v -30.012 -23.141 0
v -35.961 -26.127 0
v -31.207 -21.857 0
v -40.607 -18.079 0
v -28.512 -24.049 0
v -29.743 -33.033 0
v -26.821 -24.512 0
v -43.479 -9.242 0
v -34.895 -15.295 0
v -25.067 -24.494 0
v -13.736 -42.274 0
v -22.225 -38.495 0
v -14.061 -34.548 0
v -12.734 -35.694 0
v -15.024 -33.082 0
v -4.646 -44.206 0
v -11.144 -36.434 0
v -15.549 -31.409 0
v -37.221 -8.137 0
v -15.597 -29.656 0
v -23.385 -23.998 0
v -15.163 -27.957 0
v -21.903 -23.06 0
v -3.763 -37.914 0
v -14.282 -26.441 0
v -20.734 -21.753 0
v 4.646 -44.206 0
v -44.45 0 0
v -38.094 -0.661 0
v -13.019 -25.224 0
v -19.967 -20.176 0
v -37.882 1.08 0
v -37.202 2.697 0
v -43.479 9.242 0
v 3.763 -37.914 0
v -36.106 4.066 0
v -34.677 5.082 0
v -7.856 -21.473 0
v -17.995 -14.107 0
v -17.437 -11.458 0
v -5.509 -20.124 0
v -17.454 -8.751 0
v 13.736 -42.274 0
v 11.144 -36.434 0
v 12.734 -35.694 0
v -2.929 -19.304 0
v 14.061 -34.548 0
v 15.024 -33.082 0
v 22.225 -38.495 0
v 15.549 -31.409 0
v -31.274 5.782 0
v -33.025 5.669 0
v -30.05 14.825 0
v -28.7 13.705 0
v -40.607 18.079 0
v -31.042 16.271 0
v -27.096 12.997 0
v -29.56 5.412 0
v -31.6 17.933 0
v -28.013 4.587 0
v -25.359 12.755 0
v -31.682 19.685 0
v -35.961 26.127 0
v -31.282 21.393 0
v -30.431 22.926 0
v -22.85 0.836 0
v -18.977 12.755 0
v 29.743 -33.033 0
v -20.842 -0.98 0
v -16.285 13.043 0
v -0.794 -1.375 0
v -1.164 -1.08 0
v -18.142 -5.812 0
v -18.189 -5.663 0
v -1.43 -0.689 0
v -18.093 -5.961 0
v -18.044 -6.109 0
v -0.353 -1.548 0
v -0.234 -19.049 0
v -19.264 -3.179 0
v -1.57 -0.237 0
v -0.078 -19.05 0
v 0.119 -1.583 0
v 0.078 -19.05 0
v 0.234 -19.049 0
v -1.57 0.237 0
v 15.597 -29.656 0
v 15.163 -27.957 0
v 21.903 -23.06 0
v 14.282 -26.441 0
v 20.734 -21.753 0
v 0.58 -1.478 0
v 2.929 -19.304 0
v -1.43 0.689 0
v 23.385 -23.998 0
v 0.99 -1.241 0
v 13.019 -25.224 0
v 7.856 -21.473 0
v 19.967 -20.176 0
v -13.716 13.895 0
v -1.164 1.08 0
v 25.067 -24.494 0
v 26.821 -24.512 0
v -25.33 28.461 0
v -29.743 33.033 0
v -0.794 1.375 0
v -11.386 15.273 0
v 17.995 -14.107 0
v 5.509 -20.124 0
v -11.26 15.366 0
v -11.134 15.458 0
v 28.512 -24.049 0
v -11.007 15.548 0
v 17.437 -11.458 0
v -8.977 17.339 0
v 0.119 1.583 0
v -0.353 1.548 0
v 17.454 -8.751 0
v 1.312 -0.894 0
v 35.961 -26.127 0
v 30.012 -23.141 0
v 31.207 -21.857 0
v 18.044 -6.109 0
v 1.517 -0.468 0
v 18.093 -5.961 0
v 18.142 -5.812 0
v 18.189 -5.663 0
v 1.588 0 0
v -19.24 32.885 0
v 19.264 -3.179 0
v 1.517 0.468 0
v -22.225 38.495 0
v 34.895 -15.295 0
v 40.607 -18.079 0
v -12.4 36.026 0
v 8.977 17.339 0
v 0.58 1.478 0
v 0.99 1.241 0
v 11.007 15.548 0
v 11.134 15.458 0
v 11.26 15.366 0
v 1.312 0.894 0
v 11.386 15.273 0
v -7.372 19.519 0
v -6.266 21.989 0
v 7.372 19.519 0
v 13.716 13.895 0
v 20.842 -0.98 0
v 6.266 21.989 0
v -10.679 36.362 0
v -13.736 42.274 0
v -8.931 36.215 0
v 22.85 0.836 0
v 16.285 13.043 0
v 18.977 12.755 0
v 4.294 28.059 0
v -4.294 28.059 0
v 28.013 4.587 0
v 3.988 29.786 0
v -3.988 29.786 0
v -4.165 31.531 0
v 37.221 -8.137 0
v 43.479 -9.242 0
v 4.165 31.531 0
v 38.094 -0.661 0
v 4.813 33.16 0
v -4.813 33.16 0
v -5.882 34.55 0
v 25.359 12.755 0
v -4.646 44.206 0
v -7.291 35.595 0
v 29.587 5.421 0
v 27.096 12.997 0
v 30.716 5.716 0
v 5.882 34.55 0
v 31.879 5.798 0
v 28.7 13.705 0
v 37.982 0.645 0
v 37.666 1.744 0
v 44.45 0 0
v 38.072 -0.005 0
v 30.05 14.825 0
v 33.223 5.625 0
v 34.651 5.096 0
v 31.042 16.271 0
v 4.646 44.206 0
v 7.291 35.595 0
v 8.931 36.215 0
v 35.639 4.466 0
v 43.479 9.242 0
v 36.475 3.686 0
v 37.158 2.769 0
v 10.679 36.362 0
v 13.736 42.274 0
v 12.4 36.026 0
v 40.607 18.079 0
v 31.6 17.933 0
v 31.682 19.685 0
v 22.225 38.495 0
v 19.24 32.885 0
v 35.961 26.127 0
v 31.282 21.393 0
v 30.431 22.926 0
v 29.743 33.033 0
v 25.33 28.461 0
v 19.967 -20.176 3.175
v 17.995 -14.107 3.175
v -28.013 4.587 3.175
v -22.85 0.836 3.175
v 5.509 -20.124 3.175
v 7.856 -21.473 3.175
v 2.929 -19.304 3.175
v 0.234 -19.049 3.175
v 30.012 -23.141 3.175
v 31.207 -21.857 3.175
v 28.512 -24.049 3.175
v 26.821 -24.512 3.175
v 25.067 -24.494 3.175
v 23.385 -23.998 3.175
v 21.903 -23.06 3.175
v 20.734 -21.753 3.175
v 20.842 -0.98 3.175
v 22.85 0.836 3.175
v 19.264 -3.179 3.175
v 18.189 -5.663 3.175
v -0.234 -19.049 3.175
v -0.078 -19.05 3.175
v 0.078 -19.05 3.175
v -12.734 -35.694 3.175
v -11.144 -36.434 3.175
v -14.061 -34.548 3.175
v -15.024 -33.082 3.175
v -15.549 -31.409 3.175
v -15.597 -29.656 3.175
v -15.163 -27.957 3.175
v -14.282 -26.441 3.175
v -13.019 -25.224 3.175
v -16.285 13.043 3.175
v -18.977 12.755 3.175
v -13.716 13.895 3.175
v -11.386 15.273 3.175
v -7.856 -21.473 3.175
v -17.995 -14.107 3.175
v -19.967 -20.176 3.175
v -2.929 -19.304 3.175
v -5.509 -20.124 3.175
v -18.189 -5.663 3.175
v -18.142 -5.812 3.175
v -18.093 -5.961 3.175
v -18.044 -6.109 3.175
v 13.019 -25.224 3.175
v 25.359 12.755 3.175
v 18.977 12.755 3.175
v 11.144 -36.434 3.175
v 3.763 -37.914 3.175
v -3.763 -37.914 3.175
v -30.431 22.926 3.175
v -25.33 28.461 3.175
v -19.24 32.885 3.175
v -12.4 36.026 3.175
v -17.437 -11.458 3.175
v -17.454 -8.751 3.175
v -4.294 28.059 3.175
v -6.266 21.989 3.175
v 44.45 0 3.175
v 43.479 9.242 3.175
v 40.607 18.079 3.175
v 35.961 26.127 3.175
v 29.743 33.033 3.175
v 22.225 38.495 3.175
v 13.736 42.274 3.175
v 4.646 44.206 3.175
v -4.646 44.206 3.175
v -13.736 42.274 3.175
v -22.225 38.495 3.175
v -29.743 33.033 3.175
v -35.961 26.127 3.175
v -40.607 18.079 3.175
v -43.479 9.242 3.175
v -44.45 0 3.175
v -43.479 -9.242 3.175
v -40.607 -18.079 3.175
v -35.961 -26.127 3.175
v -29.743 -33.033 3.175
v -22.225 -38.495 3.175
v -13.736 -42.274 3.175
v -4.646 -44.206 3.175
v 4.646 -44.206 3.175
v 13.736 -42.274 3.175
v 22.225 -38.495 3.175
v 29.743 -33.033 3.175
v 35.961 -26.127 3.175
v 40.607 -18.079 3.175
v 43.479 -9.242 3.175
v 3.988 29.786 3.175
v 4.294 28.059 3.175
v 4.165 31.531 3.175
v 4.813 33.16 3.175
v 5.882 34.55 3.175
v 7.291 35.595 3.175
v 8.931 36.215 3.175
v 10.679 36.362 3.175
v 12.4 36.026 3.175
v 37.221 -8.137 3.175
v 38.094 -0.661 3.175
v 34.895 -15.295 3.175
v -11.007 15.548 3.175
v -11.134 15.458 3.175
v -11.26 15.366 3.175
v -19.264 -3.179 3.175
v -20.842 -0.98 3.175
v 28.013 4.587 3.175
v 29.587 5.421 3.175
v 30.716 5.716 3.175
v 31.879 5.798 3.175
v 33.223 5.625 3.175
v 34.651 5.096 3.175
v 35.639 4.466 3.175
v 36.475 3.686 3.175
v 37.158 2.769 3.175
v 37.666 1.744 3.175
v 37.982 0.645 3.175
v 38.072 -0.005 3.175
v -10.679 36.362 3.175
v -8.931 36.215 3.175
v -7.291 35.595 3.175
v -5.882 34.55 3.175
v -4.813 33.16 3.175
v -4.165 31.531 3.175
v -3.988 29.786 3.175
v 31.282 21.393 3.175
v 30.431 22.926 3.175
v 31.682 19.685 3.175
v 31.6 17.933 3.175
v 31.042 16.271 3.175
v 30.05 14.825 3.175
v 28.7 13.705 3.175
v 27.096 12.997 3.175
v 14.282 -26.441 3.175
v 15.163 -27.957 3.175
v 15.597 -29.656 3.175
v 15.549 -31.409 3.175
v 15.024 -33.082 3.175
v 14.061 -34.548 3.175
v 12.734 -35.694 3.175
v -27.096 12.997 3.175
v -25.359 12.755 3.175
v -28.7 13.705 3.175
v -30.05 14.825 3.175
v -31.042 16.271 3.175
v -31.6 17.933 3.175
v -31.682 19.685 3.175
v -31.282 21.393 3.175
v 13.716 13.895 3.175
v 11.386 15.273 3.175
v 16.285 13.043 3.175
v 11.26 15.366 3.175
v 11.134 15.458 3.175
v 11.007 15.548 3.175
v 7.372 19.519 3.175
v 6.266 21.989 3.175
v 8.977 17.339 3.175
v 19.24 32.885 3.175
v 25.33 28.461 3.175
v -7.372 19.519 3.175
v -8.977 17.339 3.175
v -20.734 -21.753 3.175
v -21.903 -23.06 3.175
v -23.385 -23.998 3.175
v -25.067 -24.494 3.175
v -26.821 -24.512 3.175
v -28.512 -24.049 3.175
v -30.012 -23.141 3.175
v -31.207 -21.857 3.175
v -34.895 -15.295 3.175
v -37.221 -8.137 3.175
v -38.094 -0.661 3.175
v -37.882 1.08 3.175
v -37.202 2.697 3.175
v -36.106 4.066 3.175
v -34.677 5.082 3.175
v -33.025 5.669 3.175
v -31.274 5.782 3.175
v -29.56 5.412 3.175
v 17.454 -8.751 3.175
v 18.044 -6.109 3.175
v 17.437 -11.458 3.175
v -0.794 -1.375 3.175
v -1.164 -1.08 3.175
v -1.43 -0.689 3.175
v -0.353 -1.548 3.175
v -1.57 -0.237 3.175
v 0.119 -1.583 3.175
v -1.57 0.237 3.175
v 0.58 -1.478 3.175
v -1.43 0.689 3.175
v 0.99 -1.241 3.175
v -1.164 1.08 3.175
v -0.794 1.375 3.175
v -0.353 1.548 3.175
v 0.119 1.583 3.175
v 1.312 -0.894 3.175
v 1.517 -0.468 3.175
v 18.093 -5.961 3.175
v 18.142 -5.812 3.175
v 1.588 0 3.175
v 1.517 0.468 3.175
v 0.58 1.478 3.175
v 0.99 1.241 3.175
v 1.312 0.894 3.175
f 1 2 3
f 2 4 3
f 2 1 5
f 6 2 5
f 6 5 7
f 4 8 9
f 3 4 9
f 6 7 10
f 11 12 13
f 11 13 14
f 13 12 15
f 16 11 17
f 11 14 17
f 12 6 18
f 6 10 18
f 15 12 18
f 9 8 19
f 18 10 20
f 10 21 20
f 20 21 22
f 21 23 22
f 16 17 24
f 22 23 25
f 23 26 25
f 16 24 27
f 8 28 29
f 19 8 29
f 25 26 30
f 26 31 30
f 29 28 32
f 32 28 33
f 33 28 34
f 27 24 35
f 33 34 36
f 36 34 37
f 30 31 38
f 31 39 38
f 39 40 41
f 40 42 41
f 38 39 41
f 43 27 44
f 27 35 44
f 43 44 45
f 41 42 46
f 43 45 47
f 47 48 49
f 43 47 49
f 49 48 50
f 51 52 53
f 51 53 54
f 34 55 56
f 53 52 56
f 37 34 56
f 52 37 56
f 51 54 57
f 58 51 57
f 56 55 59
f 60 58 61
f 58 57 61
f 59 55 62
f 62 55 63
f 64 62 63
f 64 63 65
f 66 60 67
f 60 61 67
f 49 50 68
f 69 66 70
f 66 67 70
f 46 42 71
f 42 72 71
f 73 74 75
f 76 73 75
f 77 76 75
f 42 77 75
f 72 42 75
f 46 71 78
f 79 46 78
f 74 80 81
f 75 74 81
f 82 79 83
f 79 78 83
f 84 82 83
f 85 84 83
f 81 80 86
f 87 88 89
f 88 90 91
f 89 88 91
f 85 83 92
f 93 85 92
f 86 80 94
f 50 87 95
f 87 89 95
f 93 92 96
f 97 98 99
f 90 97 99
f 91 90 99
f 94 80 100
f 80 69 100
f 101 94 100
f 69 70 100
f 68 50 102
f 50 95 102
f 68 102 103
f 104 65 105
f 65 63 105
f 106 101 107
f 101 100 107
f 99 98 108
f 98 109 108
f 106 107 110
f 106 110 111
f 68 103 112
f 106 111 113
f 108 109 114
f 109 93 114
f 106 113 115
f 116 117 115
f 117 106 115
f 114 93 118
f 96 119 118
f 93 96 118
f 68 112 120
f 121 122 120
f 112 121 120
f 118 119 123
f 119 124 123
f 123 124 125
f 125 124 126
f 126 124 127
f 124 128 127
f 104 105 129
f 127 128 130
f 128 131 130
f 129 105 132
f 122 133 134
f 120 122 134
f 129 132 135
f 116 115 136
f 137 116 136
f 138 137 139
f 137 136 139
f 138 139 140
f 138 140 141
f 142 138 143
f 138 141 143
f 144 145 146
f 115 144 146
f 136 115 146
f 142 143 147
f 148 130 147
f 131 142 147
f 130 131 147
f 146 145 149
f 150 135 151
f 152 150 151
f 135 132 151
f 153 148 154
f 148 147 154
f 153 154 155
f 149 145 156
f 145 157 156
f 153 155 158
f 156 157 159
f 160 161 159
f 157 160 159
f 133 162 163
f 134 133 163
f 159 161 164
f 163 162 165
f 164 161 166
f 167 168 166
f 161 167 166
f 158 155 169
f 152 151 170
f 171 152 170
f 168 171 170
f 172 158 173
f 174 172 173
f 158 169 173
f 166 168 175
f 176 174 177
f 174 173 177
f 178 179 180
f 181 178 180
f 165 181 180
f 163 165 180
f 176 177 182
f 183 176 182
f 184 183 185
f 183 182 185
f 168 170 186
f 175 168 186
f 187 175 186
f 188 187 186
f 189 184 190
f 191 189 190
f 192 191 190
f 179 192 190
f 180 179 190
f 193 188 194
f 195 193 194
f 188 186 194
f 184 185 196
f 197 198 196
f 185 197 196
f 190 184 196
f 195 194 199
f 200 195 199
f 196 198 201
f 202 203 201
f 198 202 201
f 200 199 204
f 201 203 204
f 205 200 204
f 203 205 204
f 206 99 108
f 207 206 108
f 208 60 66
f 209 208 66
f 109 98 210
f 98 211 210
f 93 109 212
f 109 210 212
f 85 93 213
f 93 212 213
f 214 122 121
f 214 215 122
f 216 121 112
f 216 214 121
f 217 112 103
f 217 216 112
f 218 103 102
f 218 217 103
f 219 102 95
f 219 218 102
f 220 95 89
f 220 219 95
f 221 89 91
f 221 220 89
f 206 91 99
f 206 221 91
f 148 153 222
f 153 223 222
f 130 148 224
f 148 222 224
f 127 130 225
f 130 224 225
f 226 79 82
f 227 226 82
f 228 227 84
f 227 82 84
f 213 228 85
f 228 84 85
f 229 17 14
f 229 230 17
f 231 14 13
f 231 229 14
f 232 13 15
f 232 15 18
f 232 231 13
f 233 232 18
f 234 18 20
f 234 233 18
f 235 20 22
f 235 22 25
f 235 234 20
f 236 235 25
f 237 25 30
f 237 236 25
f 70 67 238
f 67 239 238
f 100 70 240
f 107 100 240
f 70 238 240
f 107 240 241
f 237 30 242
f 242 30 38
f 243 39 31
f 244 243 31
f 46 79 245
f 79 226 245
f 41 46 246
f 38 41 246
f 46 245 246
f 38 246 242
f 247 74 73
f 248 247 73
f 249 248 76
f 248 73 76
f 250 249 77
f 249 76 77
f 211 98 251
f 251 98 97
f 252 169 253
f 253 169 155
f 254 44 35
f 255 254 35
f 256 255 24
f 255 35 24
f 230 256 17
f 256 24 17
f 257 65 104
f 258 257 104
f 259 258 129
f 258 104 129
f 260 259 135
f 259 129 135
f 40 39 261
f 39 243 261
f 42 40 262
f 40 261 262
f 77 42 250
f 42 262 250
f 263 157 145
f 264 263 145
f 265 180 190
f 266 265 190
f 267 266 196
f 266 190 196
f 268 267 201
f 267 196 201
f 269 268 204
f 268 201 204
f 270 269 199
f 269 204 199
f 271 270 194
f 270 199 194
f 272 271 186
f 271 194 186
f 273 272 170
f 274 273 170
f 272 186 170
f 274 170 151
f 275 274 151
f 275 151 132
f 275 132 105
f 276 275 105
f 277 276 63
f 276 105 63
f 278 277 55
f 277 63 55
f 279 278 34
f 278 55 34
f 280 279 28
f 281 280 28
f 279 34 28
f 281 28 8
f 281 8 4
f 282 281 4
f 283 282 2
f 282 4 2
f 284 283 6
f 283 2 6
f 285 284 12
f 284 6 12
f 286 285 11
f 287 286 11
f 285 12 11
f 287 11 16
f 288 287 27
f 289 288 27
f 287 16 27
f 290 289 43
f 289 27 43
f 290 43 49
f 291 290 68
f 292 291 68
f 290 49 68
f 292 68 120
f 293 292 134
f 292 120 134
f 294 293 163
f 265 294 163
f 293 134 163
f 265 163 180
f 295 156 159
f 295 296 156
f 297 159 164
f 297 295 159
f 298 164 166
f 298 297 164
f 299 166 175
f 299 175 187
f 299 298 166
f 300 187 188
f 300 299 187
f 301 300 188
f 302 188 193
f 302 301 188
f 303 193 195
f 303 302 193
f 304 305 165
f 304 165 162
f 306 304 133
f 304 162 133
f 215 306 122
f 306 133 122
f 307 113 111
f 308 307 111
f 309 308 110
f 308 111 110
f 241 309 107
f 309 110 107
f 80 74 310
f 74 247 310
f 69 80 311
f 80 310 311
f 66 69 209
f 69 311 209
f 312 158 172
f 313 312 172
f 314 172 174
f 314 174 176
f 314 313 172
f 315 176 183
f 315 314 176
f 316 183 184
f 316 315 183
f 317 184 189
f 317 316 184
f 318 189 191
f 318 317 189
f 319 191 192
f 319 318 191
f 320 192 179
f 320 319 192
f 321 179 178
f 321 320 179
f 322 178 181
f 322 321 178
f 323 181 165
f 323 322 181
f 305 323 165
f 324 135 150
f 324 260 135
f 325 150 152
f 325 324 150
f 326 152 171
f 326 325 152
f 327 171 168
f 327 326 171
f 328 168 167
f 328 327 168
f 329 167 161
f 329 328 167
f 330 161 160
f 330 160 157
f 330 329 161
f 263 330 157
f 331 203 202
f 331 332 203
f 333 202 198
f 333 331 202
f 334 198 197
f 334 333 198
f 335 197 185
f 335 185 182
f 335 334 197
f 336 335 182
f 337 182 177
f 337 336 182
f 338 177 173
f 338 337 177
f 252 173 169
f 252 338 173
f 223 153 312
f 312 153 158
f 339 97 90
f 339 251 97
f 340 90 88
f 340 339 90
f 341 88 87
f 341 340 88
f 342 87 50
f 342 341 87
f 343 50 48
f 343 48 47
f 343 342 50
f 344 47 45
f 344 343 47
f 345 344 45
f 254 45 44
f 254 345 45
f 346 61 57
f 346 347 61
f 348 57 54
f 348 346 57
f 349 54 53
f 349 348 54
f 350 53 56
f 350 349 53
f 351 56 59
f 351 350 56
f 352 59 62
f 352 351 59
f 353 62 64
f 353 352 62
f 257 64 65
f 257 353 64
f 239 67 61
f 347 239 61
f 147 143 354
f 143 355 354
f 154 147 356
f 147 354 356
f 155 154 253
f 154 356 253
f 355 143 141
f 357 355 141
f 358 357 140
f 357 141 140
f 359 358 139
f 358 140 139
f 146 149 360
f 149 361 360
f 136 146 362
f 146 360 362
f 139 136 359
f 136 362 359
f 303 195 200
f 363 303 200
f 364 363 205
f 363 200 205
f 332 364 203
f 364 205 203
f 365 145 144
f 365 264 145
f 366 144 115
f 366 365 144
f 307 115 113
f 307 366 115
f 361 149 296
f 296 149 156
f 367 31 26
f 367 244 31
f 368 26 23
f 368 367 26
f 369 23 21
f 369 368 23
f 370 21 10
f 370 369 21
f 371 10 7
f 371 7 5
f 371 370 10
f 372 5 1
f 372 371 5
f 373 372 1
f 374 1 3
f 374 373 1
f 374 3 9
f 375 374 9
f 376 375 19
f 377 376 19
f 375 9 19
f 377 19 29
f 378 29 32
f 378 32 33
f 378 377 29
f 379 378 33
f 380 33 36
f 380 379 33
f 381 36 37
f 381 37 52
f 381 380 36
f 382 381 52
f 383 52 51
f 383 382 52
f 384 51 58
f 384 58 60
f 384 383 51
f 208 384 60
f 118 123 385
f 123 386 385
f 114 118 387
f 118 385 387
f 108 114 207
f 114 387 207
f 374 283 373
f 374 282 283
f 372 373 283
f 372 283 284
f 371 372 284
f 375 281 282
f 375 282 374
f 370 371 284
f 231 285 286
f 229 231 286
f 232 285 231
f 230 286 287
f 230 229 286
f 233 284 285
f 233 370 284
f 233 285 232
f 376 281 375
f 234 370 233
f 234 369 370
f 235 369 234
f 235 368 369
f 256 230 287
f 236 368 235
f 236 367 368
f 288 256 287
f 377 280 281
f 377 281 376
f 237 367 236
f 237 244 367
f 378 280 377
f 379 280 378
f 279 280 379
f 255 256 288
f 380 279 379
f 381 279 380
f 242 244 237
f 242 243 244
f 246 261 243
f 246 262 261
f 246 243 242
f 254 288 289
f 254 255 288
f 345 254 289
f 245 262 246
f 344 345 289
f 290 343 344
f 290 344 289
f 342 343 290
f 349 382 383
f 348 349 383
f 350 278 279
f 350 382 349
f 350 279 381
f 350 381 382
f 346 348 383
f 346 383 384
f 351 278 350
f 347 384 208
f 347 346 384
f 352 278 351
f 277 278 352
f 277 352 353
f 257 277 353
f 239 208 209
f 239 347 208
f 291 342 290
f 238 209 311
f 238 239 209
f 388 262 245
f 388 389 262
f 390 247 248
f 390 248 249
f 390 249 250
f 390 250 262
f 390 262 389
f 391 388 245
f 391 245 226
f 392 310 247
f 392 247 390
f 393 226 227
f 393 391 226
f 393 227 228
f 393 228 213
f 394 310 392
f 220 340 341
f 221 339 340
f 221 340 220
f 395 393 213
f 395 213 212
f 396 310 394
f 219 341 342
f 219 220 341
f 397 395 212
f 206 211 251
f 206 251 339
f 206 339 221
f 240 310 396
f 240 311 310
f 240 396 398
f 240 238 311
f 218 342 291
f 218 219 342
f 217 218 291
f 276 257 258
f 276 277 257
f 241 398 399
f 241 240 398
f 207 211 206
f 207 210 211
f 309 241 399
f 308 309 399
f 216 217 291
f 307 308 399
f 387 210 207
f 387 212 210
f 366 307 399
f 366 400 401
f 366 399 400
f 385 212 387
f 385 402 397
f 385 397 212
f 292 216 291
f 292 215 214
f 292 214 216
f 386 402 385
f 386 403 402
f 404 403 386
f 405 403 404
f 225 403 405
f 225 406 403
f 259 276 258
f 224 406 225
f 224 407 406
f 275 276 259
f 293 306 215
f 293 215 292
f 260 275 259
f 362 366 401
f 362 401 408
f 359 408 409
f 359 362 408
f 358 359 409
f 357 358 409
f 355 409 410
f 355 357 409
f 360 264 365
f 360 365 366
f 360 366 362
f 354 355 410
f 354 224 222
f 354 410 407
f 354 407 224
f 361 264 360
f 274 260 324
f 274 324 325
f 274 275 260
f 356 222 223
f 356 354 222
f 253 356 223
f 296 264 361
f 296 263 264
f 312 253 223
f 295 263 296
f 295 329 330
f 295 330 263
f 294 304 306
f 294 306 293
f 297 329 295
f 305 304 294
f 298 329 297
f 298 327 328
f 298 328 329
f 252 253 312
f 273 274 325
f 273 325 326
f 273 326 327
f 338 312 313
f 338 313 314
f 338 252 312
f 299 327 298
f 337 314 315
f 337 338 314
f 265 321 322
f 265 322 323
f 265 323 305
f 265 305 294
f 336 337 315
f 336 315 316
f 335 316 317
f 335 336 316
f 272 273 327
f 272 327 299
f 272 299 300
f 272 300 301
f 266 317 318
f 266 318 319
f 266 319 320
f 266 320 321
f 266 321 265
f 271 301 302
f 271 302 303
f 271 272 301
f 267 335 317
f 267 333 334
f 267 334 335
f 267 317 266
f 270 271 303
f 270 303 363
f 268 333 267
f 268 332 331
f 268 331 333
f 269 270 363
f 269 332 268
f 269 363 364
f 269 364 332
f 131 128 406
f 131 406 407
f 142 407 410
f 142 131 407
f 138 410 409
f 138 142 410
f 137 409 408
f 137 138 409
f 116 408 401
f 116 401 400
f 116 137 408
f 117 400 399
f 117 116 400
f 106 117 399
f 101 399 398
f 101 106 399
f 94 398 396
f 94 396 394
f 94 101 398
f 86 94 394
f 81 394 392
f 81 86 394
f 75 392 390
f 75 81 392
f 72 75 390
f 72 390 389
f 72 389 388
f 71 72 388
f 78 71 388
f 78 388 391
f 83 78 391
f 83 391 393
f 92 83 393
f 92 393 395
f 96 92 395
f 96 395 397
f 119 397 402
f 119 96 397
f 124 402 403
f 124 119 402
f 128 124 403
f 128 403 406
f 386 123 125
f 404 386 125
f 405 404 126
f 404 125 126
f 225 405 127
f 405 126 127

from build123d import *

# Parameters (mm, degrees)
F0_R     = 44.45
F0_R_2   = 1.5875
F1_DEPTH = 3.175
F2_R     = 12.7
F3_R     = 6.35


with BuildPart() as f1:
    # F0 (on Top) → F1 (new body)
    with BuildSketch(Plane.XY):
        Circle(F0_R)
        with BuildLine():
            ThreePointArc((39.2548577101, 12.7546764428), (40.7668362581, 6.4568325445), (41.275, 0))
            ThreePointArc((41.275, 0), (36.7762942859, -18.7384578767), (24.2608362884, -33.3921764428))
            ThreePointArc((24.2608362884, -33.3921764428), (0, -41.275), (-24.2608362884, -33.3921764428))
            ThreePointArc((-24.2608362884, -33.3921764428), (-39.2548577101, -12.7546764428), (-39.2548577101, 12.7546764428))
            ThreePointArc((-39.2548577101, 12.7546764428), (-24.2608362884, 33.3921764428), (0, 41.275))
            ThreePointArc((0, 41.275), (24.2608362884, 33.3921764428), (39.2548577101, 12.7546764428))
        make_face(mode=Mode.SUBTRACT)
        with BuildLine():
            Line((-1.0361992177, 38.0859067265), (0, 41.275))
            ThreePointArc((0, 41.275), (-24.2608362884, 33.3921764428), (-39.2548577101, 12.7546764428))
            Line((-39.2548577101, 12.7546764428), (-35.9016466034, 12.7546764428))
            ThreePointArc((-35.9016466034, 12.7546764428), (-22.3946181123, 30.8235474857), (-1.0361992177, 38.0859067265))
        make_face()
        with BuildLine():
            ThreePointArc((-39.2548577101, 12.7546764428), (-39.2548577101, -12.7546764428), (-24.2608362884, -33.3921764428))
            Line((-24.2608362884, -33.3921764428), (-23.2246370707, -30.2030831693))
            ThreePointArc((-23.2246370707, -30.2030831693), (-36.2352532708, -11.7735474857), (-36.5420529391, 10.7837084065))
            Line((-36.5420529391, 10.7837084065), (-39.2548577101, 12.7546764428))
        make_face()
        with BuildLine():
            ThreePointArc((-24.2608362884, -33.3921764428), (0, -41.275), (24.2608362884, -33.3921764428))
            Line((24.2608362884, -33.3921764428), (21.5480315174, -31.4212084065))
            ThreePointArc((21.5480315174, -31.4212084065), (0, -38.1), (-21.5480315174, -31.4212084065))
            Line((-21.5480315174, -31.4212084065), (-24.2608362884, -33.3921764428))
        make_face()
        with BuildLine():
            ThreePointArc((24.2608362884, -33.3921764428), (36.7762942859, -18.7384578767), (41.275, 0))
            ThreePointArc((41.275, 0), (40.7668362581, 6.4568325445), (39.2548577101, 12.7546764428))
            Line((39.2548577101, 12.7546764428), (36.5420529391, 10.7837084065))
            ThreePointArc((36.5420529391, 10.7837084065), (37.7085018065, 5.447833653), (38.1, 0))
            ThreePointArc((38.1, 0), (34.1794431815, -16.833765586), (23.2246370707, -30.2030831693))
            Line((23.2246370707, -30.2030831693), (24.2608362884, -33.3921764428))
        make_face()
        with BuildLine():
            Line((35.9016466034, 12.7546764428), (39.2548577101, 12.7546764428))
            ThreePointArc((39.2548577101, 12.7546764428), (24.2608362884, 33.3921764428), (0, 41.275))
            Line((0, 41.275), (1.0361992177, 38.0859067265))
            ThreePointArc((1.0361992177, 38.0859067265), (22.3946181123, 30.8235474857), (35.9016466034, 12.7546764428))
        make_face()
        with BuildLine():
            Line((7.7578470137, 17.398801962), (1.0361992177, 38.0859067265))
            ThreePointArc((1.0361992177, 38.0859067265), (0, 38.1), (-1.0361992177, 38.0859067265))
            Line((-1.0361992177, 38.0859067265), (-7.7578470137, 17.398801962))
            ThreePointArc((-7.7578470137, 17.398801962), (0, 19.05), (7.7578470137, 17.398801962))
        make_face()
        with BuildLine():
            Line((-14.1499374147, 12.7546764428), (-35.9016466034, 12.7546764428))
            ThreePointArc((-35.9016466034, 12.7546764428), (-36.2352532708, 11.7735474857), (-36.5420529391, 10.7837084065))
            Line((-36.5420529391, 10.7837084065), (-18.9445505487, -2.0016254668))
            ThreePointArc((-18.9445505487, -2.0016254668), (-18.1176266354, 5.8867737428), (-14.1499374147, 12.7546764428))
        make_face()
        with BuildLine():
            Line((18.9445505487, -2.0016254668), (36.5420529391, 10.7837084065))
            ThreePointArc((36.5420529391, 10.7837084065), (36.2352532708, 11.7735474857), (35.9016466034, 12.7546764428))
            Line((35.9016466034, 12.7546764428), (14.1499374147, 12.7546764428))
            ThreePointArc((14.1499374147, 12.7546764428), (17.7828401521, 6.8317710826), (19.05, 0))
            ThreePointArc((19.05, 0), (19.0236193711, -1.0022005907), (18.9445505487, -2.0016254668))
        make_face()
        with BuildLine():
            Line((3.9505291269, -18.6358745332), (21.5480315174, -31.4212084065))
            ThreePointArc((21.5480315174, -31.4212084065), (22.3946181123, -30.8235474857), (23.2246370707, -30.2030831693))
            Line((23.2246370707, -30.2030831693), (16.5029892747, -9.5159784048))
            ThreePointArc((16.5029892747, -9.5159784048), (11.1973090562, -15.4117737428), (3.9505291269, -18.6358745332))
        make_face()
        with BuildLine():
            Line((-16.5029892747, -9.5159784048), (-23.2246370707, -30.2030831693))
            ThreePointArc((-23.2246370707, -30.2030831693), (-22.3946181123, -30.8235474857), (-21.5480315174, -31.4212084065))
            Line((-21.5480315174, -31.4212084065), (-3.9505291269, -18.6358745332))
            ThreePointArc((-3.9505291269, -18.6358745332), (-11.1973090562, -15.4117737428), (-16.5029892747, -9.5159784048))
        make_face()
        with BuildLine():
            Line((-35.9016466034, 12.7546764428), (-39.2548577101, 12.7546764428))
            Line((-39.2548577101, 12.7546764428), (-36.5420529391, 10.7837084065))
            ThreePointArc((-36.5420529391, 10.7837084065), (-36.2352532708, 11.7735474857), (-35.9016466034, 12.7546764428))
        make_face()
        with BuildLine():
            Line((-23.2246370707, -30.2030831693), (-24.2608362884, -33.3921764428))
            Line((-24.2608362884, -33.3921764428), (-21.5480315174, -31.4212084065))
            ThreePointArc((-21.5480315174, -31.4212084065), (-22.3946181123, -30.8235474857), (-23.2246370707, -30.2030831693))
        make_face()
        with BuildLine():
            Line((21.5480315174, -31.4212084065), (24.2608362884, -33.3921764428))
            Line((24.2608362884, -33.3921764428), (23.2246370707, -30.2030831693))
            ThreePointArc((23.2246370707, -30.2030831693), (22.3946181123, -30.8235474857), (21.5480315174, -31.4212084065))
        make_face()
        with BuildLine():
            Line((36.5420529391, 10.7837084065), (39.2548577101, 12.7546764428))
            Line((39.2548577101, 12.7546764428), (35.9016466034, 12.7546764428))
            ThreePointArc((35.9016466034, 12.7546764428), (36.2352532708, 11.7735474857), (36.5420529391, 10.7837084065))
        make_face()
        with BuildLine():
            Line((1.0361992177, 38.0859067265), (0, 41.275))
            Line((0, 41.275), (-1.0361992177, 38.0859067265))
            ThreePointArc((-1.0361992177, 38.0859067265), (0, 38.1), (1.0361992177, 38.0859067265))
        make_face()
        with BuildLine():
            ThreePointArc((16.5029892747, -9.5159784048), (18.1176266354, -5.8867737428), (18.9445505487, -2.0016254668))
            ThreePointArc((18.9445505487, -2.0016254668), (19.0236193711, -1.0022005907), (19.05, 0))
            ThreePointArc((19.05, 0), (17.7828401521, 6.8317710826), (14.1499374147, 12.7546764428))
            ThreePointArc((14.1499374147, 12.7546764428), (11.1973090562, 15.4117737428), (7.7578470137, 17.398801962))
            ThreePointArc((7.7578470137, 17.398801962), (0, 19.05), (-7.7578470137, 17.398801962))
            ThreePointArc((-7.7578470137, 17.398801962), (-11.1973090562, 15.4117737428), (-14.1499374147, 12.7546764428))
            ThreePointArc((-14.1499374147, 12.7546764428), (-18.1176266354, 5.8867737428), (-18.9445505487, -2.0016254668))
            ThreePointArc((-18.9445505487, -2.0016254668), (-18.1176266354, -5.8867737428), (-16.5029892747, -9.5159784048))
            ThreePointArc((-16.5029892747, -9.5159784048), (-11.1973090562, -15.4117737428), (-3.9505291269, -18.6358745332))
            ThreePointArc((-3.9505291269, -18.6358745332), (0, -19.05), (3.9505291269, -18.6358745332))
            ThreePointArc((3.9505291269, -18.6358745332), (11.1973090562, -15.4117737428), (16.5029892747, -9.5159784048))
        make_face()
        Circle(F0_R_2, mode=Mode.SUBTRACT)
    extrude(amount=F1_DEPTH)

    # F2
    f2_edges = [f1.edges().sort_by_distance(p)[0] for p in [
        (-7.757847, 17.398802, 1.5875),
        (7.757847, 17.398802, 1.5875),
        (16.502989, -9.515978, 1.5875),
        (18.944551, -2.001625, 1.5875),
        (14.149937, 12.754676, 1.5875),
        (-14.149937, 12.754676, 1.5875),
        (-16.502989, -9.515978, 1.5875),
        (-18.944551, -2.001625, 1.5875),
        (-3.950529, -18.635875, 1.5875),
        (3.950529, -18.635875, 1.5875),
    ]]
    fillet(f2_edges, radius=F2_R)

    # F3
    f3_edges = [f1.edges().sort_by_distance(p)[0] for p in [
        (-21.548032, -31.421208, 1.5875),
        (21.548032, -31.421208, 1.5875),
        (-36.542053, 10.783708, 1.5875),
        (-23.224637, -30.203083, 1.5875),
        (-35.901647, 12.754676, 1.5875),
        (1.036199, 38.085907, 1.5875),
        (23.224637, -30.203083, 1.5875),
        (-1.036199, 38.085907, 1.5875),
        (35.901647, 12.754676, 1.5875),
        (36.542053, 10.783708, 1.5875),
    ]]
    fillet(f3_edges, radius=F3_R)


solid = f1.part
